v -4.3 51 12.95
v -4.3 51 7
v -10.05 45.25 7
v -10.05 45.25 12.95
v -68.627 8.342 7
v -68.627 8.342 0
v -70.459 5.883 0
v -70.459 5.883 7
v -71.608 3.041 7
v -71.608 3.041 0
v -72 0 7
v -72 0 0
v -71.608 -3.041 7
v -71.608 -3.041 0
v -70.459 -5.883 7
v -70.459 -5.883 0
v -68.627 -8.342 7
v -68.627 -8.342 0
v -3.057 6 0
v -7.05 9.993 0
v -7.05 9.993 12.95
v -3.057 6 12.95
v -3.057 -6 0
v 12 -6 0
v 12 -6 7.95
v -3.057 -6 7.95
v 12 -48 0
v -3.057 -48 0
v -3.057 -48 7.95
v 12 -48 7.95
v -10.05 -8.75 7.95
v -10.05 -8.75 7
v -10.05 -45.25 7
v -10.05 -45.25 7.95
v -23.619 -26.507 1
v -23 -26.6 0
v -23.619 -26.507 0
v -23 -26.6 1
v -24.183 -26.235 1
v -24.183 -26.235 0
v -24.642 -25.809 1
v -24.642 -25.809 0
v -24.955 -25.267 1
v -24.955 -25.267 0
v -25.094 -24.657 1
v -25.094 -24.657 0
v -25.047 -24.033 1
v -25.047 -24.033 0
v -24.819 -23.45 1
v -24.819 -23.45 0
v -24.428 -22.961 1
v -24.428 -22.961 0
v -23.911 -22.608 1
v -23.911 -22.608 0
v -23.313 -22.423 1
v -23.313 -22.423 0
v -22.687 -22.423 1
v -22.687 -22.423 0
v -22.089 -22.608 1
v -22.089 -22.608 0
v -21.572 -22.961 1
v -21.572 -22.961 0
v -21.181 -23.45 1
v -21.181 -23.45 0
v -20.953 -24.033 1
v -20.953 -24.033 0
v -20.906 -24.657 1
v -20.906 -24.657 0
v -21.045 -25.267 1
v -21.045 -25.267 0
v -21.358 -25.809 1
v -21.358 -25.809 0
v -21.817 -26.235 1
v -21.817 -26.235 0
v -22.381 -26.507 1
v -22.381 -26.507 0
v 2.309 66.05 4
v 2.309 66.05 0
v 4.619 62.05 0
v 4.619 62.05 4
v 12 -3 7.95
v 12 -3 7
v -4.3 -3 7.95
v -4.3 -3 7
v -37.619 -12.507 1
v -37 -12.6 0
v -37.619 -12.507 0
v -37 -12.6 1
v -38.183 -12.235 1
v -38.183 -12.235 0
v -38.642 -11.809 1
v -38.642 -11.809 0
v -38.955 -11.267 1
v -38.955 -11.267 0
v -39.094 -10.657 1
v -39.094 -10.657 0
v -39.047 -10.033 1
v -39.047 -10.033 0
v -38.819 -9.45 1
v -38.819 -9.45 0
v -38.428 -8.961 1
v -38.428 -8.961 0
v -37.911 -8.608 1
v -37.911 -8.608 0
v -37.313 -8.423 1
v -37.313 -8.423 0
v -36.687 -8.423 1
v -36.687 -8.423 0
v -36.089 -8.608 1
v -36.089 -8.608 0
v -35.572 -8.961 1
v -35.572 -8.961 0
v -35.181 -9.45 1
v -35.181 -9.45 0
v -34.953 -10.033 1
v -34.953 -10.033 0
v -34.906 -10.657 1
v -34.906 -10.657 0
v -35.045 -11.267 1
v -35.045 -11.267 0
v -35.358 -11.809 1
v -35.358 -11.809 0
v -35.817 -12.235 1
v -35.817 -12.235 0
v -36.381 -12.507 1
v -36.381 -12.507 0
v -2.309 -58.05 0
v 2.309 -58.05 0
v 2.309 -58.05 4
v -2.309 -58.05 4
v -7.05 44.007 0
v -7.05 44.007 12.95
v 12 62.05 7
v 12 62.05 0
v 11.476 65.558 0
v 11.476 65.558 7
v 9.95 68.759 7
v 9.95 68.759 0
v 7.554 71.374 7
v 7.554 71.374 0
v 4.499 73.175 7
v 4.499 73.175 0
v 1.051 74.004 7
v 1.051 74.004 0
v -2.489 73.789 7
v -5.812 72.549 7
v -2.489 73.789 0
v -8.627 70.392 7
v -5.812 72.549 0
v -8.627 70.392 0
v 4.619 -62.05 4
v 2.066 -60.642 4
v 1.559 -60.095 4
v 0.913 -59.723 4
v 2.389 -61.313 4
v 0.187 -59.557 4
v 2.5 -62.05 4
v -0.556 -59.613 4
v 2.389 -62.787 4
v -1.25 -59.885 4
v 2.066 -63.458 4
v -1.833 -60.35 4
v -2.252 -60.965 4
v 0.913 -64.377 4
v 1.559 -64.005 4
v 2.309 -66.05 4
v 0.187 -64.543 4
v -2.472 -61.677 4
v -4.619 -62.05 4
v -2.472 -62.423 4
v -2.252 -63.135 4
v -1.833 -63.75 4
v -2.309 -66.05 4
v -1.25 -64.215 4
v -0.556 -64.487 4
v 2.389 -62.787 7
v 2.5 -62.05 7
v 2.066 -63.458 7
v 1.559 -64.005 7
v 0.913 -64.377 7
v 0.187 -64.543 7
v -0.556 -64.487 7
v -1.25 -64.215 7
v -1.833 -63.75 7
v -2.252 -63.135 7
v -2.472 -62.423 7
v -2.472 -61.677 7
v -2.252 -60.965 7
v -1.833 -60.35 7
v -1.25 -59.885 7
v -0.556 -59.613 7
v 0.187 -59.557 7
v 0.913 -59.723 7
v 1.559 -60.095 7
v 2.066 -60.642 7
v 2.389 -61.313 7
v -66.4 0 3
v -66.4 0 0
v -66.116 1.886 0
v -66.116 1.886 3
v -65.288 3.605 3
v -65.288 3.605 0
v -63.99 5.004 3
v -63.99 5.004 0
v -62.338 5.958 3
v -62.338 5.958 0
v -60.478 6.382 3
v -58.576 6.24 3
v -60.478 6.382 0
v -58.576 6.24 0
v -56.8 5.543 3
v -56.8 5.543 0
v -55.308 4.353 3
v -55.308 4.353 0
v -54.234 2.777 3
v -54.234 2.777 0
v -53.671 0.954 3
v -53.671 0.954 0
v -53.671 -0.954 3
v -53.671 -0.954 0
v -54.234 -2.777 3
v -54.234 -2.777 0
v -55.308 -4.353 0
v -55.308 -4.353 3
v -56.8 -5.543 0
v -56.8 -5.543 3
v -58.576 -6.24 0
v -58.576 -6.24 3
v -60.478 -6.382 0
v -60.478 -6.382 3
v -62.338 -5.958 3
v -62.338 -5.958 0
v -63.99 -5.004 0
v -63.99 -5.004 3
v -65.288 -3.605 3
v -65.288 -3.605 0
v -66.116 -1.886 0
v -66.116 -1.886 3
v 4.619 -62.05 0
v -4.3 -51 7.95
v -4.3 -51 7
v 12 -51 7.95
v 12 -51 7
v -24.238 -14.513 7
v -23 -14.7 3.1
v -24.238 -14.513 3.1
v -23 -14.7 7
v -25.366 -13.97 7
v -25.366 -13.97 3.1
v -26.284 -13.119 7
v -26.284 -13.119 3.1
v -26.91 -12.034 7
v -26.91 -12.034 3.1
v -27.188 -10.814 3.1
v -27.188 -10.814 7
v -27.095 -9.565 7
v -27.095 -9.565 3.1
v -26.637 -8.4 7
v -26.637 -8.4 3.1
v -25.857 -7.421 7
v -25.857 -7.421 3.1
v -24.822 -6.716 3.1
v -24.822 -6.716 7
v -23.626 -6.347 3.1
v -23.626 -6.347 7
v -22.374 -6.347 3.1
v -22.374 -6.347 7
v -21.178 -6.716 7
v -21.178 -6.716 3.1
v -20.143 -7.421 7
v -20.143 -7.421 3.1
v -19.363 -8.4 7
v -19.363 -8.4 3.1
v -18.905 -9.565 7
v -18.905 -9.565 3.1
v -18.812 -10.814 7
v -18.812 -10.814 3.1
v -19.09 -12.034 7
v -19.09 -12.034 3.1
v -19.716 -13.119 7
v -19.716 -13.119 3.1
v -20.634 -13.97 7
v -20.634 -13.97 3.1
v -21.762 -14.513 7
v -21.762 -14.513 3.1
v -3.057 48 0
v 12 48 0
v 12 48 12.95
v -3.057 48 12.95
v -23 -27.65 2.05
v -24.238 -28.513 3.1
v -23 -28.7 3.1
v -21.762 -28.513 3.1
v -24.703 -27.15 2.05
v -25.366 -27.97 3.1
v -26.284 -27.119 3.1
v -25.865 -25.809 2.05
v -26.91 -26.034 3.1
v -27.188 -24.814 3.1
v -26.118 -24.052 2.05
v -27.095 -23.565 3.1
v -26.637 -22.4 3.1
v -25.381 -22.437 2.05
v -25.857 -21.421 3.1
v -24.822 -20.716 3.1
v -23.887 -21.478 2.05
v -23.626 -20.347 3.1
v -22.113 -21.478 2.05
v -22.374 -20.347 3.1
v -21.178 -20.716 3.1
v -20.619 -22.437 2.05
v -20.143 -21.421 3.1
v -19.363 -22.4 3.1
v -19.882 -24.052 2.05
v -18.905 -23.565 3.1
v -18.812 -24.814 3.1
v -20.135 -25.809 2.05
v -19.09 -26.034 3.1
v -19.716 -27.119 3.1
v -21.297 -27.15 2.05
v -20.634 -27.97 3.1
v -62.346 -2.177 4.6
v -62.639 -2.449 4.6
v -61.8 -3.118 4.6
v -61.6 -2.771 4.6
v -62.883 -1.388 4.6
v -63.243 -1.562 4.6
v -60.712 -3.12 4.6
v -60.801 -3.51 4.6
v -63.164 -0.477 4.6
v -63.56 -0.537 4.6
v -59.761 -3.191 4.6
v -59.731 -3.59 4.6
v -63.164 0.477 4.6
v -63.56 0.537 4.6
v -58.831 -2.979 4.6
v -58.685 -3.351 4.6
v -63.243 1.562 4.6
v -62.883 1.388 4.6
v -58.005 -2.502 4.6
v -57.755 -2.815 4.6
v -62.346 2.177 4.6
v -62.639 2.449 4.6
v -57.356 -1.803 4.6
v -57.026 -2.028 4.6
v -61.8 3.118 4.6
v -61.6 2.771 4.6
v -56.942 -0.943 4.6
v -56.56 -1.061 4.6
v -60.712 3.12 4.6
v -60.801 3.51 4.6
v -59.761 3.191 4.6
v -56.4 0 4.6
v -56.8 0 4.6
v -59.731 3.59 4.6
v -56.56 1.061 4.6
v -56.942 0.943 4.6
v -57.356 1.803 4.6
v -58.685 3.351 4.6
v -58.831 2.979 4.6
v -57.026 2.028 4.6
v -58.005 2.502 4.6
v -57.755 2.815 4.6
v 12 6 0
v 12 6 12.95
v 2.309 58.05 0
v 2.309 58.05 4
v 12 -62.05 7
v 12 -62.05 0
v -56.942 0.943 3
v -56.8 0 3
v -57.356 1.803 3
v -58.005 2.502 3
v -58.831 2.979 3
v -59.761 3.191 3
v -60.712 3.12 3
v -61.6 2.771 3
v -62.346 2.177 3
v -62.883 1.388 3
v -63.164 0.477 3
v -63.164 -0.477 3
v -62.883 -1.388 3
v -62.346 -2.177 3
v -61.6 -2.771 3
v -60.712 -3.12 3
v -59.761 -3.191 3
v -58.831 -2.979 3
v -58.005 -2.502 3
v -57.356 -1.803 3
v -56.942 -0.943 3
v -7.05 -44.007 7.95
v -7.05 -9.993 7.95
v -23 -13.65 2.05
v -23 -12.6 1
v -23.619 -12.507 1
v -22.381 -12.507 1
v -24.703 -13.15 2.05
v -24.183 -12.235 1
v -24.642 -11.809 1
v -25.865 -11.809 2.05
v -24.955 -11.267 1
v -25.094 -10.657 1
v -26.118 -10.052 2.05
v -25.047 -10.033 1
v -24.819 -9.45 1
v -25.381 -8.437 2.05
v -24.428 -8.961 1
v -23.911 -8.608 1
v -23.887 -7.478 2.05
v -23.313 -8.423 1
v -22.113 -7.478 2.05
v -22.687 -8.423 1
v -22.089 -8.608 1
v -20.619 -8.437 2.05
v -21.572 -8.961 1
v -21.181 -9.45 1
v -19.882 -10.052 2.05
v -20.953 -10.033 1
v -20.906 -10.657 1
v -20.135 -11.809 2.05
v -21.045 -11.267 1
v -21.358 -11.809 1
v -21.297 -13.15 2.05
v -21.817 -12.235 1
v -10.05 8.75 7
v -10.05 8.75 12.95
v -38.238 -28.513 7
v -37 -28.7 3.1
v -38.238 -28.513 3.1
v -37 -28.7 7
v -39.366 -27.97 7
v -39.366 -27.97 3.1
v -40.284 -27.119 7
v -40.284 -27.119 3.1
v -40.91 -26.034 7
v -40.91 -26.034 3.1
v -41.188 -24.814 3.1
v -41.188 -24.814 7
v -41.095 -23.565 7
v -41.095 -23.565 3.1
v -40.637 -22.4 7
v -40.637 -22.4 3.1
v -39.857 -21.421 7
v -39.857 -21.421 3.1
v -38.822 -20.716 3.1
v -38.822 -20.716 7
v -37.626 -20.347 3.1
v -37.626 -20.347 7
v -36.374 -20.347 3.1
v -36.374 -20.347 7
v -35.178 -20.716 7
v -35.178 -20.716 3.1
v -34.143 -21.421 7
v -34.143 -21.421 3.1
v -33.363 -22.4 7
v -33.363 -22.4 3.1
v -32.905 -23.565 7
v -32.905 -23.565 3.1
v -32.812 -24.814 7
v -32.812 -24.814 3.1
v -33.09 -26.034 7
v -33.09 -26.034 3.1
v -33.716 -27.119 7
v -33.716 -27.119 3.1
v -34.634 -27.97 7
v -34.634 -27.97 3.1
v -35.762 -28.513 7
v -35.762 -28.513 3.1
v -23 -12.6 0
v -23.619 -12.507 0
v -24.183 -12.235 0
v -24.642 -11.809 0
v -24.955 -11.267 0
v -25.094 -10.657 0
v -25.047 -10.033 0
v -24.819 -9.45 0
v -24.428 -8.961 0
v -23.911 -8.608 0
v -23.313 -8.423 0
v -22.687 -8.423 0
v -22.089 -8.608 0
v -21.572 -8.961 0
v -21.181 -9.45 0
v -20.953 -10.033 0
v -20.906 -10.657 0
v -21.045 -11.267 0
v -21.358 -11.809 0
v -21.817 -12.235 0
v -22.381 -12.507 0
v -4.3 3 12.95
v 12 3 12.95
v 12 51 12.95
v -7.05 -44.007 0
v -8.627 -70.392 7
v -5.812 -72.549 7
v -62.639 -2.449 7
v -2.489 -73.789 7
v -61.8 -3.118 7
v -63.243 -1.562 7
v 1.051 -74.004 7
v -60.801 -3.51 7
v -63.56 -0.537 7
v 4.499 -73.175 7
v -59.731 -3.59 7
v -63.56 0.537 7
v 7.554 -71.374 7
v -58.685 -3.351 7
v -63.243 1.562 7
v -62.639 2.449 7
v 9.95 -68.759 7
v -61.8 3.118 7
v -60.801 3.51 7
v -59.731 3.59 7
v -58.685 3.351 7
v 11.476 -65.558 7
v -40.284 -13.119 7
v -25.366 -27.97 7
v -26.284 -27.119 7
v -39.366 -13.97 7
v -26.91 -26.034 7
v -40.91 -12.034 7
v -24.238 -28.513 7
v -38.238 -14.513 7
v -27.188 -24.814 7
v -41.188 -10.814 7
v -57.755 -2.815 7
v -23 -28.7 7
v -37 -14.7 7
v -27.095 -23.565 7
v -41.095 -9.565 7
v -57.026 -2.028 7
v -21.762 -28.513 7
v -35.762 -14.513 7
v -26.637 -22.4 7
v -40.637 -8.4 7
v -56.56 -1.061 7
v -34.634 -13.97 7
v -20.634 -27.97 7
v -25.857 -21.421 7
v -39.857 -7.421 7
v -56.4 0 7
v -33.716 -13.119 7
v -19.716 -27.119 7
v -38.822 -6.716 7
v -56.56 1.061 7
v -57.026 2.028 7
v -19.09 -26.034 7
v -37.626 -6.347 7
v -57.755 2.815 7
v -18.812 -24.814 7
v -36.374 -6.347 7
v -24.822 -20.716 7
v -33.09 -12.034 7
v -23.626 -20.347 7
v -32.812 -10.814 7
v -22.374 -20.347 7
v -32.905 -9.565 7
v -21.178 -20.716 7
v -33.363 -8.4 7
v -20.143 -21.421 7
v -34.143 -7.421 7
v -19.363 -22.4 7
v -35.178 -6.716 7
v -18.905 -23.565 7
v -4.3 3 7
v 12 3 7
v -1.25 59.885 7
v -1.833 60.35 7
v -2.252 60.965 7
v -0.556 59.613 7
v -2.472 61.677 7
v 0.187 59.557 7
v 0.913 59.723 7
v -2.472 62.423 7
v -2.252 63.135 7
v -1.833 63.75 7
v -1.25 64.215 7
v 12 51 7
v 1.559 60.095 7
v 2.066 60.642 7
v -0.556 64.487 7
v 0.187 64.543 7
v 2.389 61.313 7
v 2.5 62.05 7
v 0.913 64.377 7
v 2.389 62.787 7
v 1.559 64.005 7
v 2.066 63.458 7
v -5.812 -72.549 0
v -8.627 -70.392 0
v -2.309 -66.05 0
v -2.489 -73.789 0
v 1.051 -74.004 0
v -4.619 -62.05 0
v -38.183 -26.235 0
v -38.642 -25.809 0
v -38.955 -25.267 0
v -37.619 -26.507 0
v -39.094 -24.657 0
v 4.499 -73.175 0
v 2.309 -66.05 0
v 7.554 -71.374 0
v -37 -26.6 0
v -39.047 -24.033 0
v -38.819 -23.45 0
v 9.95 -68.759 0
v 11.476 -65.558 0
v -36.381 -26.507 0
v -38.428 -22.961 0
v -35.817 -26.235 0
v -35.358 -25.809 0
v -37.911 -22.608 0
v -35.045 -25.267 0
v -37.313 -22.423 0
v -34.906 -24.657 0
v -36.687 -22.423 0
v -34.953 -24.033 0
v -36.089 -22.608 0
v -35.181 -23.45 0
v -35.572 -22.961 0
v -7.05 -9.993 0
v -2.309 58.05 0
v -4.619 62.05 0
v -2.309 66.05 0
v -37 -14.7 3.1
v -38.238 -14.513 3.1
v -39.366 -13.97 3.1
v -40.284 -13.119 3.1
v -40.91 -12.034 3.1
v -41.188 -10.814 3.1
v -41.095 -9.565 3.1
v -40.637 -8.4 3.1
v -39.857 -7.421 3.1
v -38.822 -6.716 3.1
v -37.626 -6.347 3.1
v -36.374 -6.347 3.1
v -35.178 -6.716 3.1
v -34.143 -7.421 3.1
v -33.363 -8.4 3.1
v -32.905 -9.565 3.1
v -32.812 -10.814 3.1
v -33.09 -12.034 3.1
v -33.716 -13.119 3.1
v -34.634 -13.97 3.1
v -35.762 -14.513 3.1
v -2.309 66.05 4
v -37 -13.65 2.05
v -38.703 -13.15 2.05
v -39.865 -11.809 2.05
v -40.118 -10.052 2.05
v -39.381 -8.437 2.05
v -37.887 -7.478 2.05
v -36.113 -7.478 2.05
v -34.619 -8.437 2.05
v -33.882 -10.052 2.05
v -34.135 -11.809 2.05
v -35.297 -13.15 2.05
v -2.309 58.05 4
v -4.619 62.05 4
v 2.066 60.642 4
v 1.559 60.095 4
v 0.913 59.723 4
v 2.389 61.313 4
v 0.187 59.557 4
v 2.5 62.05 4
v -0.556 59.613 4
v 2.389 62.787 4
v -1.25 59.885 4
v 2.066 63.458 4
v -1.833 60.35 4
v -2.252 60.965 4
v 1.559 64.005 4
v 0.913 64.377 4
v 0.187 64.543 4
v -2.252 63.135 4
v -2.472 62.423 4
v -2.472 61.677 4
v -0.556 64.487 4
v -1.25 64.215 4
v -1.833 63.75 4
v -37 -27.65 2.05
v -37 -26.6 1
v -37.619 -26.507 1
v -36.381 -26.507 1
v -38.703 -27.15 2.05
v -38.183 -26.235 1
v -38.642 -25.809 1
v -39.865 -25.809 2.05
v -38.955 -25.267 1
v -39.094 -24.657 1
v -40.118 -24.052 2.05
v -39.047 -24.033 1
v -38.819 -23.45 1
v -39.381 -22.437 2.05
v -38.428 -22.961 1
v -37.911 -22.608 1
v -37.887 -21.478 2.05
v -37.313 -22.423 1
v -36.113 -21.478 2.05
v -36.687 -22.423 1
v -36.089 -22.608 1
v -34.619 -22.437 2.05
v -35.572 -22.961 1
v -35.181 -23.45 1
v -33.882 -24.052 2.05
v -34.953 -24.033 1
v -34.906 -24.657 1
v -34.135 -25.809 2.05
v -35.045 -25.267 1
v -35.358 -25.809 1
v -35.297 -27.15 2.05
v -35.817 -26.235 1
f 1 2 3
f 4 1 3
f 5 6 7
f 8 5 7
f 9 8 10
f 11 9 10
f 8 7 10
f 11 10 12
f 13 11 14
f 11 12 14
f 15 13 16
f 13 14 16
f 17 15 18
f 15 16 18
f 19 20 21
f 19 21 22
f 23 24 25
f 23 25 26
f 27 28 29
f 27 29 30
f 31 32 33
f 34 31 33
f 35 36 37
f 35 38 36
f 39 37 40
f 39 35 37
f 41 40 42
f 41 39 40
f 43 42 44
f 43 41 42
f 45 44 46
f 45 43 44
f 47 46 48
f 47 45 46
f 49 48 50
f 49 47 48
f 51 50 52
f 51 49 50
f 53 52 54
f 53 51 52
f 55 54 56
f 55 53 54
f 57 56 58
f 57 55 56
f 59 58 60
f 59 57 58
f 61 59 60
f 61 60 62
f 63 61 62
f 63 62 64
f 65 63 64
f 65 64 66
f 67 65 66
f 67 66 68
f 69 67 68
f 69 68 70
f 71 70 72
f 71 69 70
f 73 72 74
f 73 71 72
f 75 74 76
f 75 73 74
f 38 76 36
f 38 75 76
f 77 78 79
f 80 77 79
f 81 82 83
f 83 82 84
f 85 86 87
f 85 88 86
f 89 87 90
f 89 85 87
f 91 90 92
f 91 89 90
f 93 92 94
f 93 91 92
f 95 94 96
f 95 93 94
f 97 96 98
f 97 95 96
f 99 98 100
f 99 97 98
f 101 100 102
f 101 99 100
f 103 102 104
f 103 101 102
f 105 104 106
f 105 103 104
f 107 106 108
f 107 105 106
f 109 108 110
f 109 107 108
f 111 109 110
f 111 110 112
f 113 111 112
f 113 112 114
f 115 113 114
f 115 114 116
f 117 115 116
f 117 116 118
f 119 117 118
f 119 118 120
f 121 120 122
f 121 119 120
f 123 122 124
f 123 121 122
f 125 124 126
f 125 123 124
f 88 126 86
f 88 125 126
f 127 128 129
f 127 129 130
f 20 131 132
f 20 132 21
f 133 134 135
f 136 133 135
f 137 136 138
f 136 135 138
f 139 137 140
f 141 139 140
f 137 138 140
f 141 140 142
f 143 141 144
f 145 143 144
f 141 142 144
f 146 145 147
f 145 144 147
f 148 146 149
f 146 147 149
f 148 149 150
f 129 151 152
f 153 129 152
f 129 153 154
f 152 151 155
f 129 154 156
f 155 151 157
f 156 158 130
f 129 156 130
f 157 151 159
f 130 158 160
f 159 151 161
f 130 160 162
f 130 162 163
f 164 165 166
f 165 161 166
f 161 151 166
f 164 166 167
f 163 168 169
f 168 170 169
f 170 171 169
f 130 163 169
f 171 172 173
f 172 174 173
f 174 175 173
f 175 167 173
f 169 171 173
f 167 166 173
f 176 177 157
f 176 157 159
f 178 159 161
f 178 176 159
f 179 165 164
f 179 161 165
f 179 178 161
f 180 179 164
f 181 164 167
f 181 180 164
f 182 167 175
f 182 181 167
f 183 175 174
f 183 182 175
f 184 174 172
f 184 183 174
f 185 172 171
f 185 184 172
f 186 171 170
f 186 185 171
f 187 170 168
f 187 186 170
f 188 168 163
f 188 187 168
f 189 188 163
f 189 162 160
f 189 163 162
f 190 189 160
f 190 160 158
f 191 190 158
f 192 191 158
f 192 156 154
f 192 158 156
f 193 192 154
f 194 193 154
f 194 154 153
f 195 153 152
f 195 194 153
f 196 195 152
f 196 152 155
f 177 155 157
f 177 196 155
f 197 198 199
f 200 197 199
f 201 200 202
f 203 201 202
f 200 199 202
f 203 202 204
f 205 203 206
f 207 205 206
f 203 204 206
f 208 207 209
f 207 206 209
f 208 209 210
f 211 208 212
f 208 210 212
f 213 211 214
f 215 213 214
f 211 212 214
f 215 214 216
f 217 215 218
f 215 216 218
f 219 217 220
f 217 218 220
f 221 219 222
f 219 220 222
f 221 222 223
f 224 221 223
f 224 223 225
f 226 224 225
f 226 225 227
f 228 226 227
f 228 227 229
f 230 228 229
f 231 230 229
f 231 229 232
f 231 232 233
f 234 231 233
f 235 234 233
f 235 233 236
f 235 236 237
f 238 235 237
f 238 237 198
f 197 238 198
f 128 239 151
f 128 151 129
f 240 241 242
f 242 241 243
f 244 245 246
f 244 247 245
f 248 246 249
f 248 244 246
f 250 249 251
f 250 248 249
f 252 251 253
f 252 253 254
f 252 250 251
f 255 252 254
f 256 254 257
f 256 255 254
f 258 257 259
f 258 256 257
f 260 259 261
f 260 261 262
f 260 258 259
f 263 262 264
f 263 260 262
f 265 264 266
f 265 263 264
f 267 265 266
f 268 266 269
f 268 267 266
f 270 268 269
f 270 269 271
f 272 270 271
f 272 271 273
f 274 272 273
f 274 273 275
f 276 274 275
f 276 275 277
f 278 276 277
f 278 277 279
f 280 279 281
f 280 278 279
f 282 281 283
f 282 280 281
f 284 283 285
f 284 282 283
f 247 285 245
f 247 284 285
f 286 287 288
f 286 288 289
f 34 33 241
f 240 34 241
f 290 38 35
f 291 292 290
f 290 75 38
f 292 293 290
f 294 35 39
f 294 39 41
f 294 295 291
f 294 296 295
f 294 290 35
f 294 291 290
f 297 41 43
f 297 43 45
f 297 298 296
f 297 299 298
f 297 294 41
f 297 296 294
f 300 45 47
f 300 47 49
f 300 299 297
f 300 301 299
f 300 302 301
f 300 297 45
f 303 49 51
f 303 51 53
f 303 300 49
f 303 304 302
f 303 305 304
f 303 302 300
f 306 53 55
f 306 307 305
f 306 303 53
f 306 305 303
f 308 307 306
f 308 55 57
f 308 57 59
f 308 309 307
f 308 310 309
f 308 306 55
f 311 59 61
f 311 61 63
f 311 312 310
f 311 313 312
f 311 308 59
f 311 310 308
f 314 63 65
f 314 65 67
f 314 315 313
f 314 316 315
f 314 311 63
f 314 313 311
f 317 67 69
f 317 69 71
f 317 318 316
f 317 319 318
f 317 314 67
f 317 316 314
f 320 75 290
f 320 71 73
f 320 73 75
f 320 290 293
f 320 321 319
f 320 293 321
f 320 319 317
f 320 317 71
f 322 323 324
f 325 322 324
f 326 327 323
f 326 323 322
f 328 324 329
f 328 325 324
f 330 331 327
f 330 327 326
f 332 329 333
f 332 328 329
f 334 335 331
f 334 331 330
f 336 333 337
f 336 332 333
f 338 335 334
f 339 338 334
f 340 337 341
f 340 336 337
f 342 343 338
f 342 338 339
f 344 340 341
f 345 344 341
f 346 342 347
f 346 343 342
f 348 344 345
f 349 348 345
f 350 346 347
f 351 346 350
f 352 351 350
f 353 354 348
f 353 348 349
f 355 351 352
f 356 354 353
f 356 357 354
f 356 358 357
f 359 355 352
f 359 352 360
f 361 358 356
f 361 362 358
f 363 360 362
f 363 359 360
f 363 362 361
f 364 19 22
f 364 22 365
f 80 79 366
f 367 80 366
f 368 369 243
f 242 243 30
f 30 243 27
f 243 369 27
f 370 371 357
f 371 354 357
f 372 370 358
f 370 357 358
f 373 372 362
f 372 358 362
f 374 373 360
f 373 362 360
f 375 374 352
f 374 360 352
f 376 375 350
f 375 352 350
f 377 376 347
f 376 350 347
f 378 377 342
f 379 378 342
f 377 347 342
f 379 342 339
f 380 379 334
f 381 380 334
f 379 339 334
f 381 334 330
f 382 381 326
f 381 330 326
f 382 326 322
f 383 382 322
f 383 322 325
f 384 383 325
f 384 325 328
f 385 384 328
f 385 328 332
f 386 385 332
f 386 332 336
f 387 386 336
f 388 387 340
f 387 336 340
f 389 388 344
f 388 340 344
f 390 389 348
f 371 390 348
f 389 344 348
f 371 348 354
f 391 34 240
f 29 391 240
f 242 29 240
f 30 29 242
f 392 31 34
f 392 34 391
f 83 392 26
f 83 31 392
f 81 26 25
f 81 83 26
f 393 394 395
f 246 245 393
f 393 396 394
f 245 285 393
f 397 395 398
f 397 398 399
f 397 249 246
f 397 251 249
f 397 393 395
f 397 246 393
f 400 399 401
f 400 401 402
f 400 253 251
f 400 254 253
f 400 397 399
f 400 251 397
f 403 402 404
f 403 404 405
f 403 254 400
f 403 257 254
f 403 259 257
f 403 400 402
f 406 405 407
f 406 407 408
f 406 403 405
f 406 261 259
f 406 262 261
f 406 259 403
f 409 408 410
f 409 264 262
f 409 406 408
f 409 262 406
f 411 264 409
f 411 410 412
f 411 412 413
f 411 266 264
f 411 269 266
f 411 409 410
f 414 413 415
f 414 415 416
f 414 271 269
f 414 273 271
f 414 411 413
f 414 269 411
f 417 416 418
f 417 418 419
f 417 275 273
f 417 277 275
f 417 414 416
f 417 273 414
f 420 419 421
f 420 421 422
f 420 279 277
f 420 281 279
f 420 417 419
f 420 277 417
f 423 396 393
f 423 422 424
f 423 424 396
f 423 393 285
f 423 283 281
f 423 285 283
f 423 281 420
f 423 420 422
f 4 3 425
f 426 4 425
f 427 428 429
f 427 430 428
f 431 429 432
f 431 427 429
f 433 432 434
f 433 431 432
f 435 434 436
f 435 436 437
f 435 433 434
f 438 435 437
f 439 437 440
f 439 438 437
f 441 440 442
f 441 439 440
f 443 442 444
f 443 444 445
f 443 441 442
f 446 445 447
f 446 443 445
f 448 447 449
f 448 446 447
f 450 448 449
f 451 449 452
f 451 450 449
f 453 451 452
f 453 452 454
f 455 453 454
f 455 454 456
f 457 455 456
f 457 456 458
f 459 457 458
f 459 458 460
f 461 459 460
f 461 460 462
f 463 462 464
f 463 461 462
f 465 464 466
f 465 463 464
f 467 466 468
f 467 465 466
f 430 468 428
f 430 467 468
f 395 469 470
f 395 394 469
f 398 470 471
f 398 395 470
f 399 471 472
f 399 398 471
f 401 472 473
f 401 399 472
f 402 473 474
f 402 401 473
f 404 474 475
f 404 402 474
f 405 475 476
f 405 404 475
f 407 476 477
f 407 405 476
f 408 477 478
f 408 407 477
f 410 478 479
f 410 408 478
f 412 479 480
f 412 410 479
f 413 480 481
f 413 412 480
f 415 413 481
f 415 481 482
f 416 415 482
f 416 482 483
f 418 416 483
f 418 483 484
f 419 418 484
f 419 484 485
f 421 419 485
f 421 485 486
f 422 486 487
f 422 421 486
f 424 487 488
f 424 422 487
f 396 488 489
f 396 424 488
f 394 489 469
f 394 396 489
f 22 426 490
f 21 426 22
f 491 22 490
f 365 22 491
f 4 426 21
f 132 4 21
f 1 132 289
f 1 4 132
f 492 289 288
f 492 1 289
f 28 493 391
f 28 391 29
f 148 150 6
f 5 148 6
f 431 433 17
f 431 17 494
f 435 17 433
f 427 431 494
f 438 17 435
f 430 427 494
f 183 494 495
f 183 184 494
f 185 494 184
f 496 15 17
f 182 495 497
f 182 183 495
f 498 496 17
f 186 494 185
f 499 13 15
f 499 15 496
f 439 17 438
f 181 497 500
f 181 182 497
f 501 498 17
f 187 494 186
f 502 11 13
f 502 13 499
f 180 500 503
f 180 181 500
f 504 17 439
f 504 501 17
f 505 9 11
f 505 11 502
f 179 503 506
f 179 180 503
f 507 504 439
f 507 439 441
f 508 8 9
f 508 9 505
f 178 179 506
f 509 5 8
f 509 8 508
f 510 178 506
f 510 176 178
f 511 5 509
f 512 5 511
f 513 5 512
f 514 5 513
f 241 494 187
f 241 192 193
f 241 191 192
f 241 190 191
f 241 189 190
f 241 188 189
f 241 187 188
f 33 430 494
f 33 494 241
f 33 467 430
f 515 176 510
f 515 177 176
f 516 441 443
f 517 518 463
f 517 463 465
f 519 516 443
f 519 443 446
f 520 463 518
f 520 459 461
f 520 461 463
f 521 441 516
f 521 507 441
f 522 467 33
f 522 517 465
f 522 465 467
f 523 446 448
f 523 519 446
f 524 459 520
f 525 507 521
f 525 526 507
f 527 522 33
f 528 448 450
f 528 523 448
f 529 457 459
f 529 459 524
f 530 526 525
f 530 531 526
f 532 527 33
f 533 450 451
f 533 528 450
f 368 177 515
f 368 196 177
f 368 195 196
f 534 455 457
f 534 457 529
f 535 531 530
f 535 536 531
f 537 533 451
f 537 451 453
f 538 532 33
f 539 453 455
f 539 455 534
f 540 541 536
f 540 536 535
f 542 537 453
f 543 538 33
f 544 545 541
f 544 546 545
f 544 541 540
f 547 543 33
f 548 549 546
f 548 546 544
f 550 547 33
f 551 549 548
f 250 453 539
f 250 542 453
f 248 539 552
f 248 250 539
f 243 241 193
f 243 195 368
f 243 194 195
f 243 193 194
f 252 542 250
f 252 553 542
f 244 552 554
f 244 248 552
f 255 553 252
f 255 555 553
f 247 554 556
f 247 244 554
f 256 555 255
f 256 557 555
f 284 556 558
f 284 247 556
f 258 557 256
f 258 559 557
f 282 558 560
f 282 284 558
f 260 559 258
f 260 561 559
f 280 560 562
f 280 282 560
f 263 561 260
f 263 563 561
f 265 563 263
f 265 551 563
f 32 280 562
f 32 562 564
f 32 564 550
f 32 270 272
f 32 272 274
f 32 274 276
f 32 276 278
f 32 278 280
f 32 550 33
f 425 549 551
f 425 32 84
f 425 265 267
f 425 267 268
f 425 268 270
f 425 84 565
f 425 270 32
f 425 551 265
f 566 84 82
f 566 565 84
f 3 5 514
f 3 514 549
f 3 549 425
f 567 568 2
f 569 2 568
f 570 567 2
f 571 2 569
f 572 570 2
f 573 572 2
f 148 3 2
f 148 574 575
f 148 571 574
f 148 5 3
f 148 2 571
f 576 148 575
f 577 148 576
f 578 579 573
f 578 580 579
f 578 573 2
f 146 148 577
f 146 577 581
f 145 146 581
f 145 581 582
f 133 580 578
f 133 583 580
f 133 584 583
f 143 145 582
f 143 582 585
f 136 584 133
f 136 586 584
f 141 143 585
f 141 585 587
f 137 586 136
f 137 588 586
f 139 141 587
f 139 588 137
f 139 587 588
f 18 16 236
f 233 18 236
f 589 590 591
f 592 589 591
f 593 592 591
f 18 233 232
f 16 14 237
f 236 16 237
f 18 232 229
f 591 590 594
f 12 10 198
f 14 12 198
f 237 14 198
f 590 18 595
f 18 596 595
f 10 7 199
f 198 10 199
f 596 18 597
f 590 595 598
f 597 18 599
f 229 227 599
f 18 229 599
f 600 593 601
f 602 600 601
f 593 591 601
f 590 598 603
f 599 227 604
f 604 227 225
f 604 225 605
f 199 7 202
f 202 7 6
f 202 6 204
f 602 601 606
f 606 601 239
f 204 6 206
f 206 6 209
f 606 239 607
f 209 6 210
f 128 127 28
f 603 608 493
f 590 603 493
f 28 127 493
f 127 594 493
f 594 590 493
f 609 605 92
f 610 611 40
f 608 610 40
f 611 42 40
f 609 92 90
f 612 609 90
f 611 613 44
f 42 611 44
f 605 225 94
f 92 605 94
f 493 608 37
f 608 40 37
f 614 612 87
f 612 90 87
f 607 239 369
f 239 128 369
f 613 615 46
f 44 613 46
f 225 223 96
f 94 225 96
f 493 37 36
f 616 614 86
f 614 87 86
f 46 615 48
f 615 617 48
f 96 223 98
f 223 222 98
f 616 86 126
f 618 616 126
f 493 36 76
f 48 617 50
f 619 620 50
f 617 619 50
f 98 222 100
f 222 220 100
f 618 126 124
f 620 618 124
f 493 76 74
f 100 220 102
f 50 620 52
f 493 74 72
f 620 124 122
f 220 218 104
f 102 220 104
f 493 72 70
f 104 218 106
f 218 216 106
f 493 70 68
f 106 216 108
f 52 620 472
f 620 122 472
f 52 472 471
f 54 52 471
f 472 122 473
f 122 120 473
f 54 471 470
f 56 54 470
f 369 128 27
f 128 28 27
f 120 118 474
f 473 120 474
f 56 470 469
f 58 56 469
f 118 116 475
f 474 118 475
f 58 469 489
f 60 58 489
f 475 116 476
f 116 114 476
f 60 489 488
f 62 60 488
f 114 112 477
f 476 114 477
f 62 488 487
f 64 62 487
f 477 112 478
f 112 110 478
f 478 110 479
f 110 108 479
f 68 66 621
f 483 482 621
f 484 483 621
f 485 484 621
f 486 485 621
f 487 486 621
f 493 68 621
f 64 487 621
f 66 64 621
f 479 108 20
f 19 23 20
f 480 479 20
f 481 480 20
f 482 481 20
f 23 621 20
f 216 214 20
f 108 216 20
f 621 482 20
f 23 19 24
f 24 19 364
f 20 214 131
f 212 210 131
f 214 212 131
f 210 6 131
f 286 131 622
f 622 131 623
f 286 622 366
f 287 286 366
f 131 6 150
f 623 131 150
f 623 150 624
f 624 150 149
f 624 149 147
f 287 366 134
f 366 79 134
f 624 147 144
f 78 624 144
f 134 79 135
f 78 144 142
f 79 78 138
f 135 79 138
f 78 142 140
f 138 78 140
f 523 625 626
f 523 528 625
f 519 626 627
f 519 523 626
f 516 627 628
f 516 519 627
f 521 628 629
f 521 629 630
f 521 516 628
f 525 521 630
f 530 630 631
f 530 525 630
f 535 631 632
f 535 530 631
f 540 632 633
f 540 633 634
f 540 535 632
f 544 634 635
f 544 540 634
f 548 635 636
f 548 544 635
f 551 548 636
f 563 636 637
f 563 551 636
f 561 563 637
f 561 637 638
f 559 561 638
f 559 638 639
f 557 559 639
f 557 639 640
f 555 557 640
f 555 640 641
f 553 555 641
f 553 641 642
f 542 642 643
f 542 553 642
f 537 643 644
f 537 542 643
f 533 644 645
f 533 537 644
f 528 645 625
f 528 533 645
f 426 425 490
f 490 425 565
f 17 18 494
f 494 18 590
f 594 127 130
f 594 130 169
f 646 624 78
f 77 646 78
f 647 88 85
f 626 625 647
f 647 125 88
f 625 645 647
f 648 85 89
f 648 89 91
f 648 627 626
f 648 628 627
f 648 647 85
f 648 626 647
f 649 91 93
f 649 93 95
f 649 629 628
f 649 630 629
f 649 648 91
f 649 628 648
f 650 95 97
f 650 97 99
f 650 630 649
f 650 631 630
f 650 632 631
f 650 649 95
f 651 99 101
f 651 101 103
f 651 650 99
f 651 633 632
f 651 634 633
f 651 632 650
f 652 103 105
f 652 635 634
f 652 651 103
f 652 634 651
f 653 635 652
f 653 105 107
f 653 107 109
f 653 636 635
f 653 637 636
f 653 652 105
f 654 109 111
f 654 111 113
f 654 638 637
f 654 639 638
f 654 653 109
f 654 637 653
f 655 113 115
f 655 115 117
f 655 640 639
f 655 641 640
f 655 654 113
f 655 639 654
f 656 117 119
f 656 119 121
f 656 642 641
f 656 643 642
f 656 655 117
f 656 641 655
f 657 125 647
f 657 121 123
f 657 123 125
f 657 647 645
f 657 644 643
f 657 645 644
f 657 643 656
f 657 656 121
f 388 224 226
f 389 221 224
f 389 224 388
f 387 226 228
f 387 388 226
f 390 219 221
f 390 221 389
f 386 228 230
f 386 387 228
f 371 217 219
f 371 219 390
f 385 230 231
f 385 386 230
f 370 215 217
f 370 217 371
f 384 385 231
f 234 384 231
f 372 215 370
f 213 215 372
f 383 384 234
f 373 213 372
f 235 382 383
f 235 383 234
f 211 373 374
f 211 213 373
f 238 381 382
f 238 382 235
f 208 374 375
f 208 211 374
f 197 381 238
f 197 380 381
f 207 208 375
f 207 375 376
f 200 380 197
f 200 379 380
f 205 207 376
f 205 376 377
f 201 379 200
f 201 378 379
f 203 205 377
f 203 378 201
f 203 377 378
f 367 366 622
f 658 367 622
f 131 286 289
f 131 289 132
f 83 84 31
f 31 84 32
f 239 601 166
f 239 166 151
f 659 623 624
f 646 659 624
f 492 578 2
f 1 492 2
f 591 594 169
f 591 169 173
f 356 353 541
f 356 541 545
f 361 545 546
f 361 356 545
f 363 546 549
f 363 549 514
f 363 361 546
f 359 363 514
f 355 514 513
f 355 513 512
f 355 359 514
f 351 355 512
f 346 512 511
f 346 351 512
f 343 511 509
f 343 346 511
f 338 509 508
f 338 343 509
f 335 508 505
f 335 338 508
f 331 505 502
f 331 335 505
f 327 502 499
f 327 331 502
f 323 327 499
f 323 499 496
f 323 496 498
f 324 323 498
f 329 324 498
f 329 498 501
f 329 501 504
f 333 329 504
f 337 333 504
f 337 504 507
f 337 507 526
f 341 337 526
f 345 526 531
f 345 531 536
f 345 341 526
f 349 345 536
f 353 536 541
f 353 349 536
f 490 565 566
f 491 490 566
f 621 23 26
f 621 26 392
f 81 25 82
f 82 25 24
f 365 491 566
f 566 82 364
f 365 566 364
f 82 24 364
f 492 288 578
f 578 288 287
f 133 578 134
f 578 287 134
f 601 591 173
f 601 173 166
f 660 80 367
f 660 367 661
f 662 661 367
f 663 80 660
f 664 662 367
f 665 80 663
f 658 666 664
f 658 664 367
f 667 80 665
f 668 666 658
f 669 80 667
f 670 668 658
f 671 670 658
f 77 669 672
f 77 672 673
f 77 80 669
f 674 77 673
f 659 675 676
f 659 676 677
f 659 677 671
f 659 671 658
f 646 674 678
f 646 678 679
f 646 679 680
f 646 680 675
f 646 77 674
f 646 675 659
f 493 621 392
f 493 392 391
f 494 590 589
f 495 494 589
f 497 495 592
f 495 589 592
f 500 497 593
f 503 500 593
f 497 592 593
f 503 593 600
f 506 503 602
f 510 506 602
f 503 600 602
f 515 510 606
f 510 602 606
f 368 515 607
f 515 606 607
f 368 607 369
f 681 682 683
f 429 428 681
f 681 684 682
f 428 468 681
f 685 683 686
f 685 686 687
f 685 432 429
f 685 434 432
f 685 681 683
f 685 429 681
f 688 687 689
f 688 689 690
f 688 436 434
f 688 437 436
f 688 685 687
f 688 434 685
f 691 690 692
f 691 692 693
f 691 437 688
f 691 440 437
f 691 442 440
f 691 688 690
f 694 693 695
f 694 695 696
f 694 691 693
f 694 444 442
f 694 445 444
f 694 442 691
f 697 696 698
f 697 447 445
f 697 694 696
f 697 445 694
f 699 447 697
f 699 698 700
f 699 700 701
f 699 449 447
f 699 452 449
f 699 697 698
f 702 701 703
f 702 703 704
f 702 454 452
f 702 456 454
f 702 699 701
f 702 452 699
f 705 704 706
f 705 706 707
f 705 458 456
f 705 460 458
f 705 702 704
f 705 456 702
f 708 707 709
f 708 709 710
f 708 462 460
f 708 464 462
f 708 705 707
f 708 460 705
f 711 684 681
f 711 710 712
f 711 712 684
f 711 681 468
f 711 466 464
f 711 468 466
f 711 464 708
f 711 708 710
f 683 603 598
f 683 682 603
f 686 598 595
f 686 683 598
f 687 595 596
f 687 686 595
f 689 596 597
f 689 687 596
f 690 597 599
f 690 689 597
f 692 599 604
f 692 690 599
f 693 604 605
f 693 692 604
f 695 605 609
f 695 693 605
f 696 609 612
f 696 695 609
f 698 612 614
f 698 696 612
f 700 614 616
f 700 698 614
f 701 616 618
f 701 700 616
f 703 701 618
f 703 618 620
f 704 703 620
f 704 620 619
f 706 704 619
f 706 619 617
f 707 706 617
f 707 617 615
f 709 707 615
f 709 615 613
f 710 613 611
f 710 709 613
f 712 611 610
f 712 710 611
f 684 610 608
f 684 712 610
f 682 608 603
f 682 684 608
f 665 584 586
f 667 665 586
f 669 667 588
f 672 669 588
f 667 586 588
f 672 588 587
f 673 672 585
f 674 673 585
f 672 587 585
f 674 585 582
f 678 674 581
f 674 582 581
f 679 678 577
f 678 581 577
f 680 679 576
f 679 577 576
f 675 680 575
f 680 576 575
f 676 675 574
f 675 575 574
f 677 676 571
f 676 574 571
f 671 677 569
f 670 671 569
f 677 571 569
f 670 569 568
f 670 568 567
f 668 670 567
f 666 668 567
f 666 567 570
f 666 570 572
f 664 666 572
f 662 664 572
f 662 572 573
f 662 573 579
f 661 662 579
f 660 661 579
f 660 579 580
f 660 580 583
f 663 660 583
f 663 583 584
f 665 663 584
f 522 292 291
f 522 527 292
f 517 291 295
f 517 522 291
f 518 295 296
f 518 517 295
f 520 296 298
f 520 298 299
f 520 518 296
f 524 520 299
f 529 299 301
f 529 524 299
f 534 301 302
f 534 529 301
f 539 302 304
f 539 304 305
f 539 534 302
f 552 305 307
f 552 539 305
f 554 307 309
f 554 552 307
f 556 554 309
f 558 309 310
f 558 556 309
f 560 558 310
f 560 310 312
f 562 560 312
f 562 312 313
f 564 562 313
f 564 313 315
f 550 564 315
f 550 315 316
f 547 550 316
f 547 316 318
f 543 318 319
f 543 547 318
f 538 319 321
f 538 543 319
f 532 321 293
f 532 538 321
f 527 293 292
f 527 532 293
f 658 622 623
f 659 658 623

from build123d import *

# Parameters (mm, degrees)
BOSS_EXTRUDE1_DEPTH            = 7
BOSS_EXTRUDE2_DEPTH            = 5.95
BOSS_EXTRUDE3_DEPTH            = 0.95
CUT_EXTRUDE1_DEPTH             = 105.091810437
CUT_EXTRUDE2_START             = -2.4
SKETCH5_R                      = 3.6
CUT_EXTRUDE2_DEPTH             = 2.4
CBORE_FOR_M5_SHCS1_D           = 6.4
CBORE_FOR_M5_SHCS1_CBORE_D     = 12.8
CBORE_FOR_M5_SHCS1_CBORE_DEPTH = 3
CUT_EXTRUDE3_DEPTH             = 4
F_5_0_5_DIAMETER_HOLE1_D       = 5
CSK_FOR_M4_SFHCS1_AT_2_COUNT   = 2
CSK_FOR_M4_SFHCS1_AT_2_PITCH   = 14
CSK_FOR_M4_SFHCS1_AT_3_COUNT   = 2
CSK_FOR_M4_SFHCS1_AT_3_PITCH   = 19.798989873
CSK_FOR_M4_SFHCS1_AT_4_COUNT   = 2
CSK_FOR_M4_SFHCS1_AT_4_PITCH   = 14


with BuildPart() as part:
    # Sketch1 → Boss-Extrude1 (new body)
    with BuildSketch(Plane.XY):
        with BuildLine():
            Line((-8.626586736, 70.391582661), (-68.626586736, 8.341582661))
            ThreePointArc((-68.626586736, 8.341582661), (-72, 0), (-68.626586736, -8.341582661))
            Line((-68.626586736, -8.341582661), (-8.626586736, -70.391582661))
            ThreePointArc((-8.626586736, -70.391582661), (4.498942052, -73.174725633), (12, -62.05))
            Line((12, -62.05), (12, 62.05))
            ThreePointArc((12, 62.05), (4.498942052, 73.174725633), (-8.626586736, 70.391582661))
        make_face()
    extrude(amount=BOSS_EXTRUDE1_DEPTH)

    # Sketch3 → Boss-Extrude2 (add)
    with BuildSketch(Plane(origin=(0, 0, 7), x_dir=(-1, 0, 0), z_dir=(0, 0, -1))):
        Polygon((-12, 3), (-12, 51), (4.299630176, 51), (10.05, 45.249630176), (10.05, 8.750369824), (4.299630176, 3), align=None)
    extrude(amount=-BOSS_EXTRUDE2_DEPTH)

    # Sketch4 → Boss-Extrude3 (add)
    with BuildSketch(Plane.XY.offset(7)):
        Polygon((12, -51), (12, -3), (-4.299630176, -3), (-10.05, -8.750369824), (-10.05, -45.249630176), (-4.299630176, -51), align=None)
    extrude(amount=BOSS_EXTRUDE3_DEPTH)

    # Sketch2 → Cut-Extrude1 (cut, through all)
    with BuildSketch(Plane(origin=(0, 0, 0), x_dir=(-1, 0, 0), z_dir=(0, 0, -1))):
        Polygon((-34.95, 48), (3.056989489, 48), (7.05, 44.006989489), (7.05, 9.993010511), (3.056989489, 6), (-30.956989489, 6), (-30.956989489, -6), (3.056989489, -6), (7.05, -9.993010511), (7.05, -44.006989489), (3.056989489, -48), (-34.95, -48), align=None)
    extrude(amount=-CUT_EXTRUDE1_DEPTH, mode=Mode.SUBTRACT)

    # Sketch5 → Cut-Extrude2 (cut)
    with BuildSketch(Plane.XY.offset(7).offset(CUT_EXTRUDE2_START)):
        with Locations((-60, 0)):
            Circle(SKETCH5_R)
    extrude(amount=CUT_EXTRUDE2_DEPTH, mode=Mode.SUBTRACT)

    # CBORE for M5 SHCS1 (through all)
    with Locations(Plane(origin=(0, 0, 0), x_dir=(-1, 0, 0), z_dir=(0, 0, -1))):
        with Locations((60, 0)):
            CounterBoreHole(CBORE_FOR_M5_SHCS1_D / 2, CBORE_FOR_M5_SHCS1_CBORE_D / 2, CBORE_FOR_M5_SHCS1_CBORE_DEPTH)

    # Sketch8 → Cut-Extrude3 (cut)
    with BuildSketch(Plane(origin=(0, 0, 0), x_dir=(-1, 0, 0), z_dir=(0, 0, -1))):
        Polygon((-2.309401077, 58.05), (2.309401077, 58.05), (4.618802154, 62.05), (2.309401077, 66.05), (-2.309401077, 66.05), (-4.618802154, 62.05), align=None)
    cut_extrude3 = extrude(amount=-CUT_EXTRUDE3_DEPTH, mode=Mode.SUBTRACT)

    # Ø5.0 (5) Diameter Hole1 (through all)
    with Locations(Plane(origin=(0, 0, 4), x_dir=(-1, 0, 0), z_dir=(0, 0, -1))):
        with Locations((0, 62.05)):
            f_5_0_5_diameter_hole1 = Hole(F_5_0_5_DIAMETER_HOLE1_D / 2)

    # Mirror1: Cut-Extrude3, Ø5.0 (5) Diameter Hole1 across plane
    add(cut_extrude3.mirror(Plane.ZX), mode=Mode.SUBTRACT)
    add(f_5_0_5_diameter_hole1.mirror(Plane.ZX), mode=Mode.SUBTRACT)

    # Sketch12 → CSK for M4 SFHCS1 (revolve, cut)
    with BuildSketch(Plane(origin=(-37, -24.5, 7), x_dir=(0, -1, 0), z_dir=(1, 0, 0))):
        Polygon((0, 0), (0, 7), (2.1, 7), (2.1, 6), (4.2, 3.9), (4.2, 0), align=None)
    csk_for_m4_sfhcs1 = revolve(axis=Axis((-37, -24.5, 13.35), (0, 0, -1)), mode=Mode.SUBTRACT)

    # CSK for M4 SFHCS1 at 2: CSK for M4 SFHCS1 ×2
    with Locations(*[(i * CSK_FOR_M4_SFHCS1_AT_2_PITCH, 0, 0) for i in range(1, CSK_FOR_M4_SFHCS1_AT_2_COUNT)]):
        add(csk_for_m4_sfhcs1, mode=Mode.SUBTRACT)

    # CSK for M4 SFHCS1 at 3: CSK for M4 SFHCS1 ×2
    with Locations(*[Vector(0.7071067811865477, 0.7071067811865474, 0) * (i * CSK_FOR_M4_SFHCS1_AT_3_PITCH) for i in range(1, CSK_FOR_M4_SFHCS1_AT_3_COUNT)]):
        add(csk_for_m4_sfhcs1, mode=Mode.SUBTRACT)

    # CSK for M4 SFHCS1 at 4: CSK for M4 SFHCS1 ×2
    with Locations(*[(0, i * CSK_FOR_M4_SFHCS1_AT_4_PITCH, 0) for i in range(1, CSK_FOR_M4_SFHCS1_AT_4_COUNT)]):
        add(csk_for_m4_sfhcs1, mode=Mode.SUBTRACT)


solid = part.part
